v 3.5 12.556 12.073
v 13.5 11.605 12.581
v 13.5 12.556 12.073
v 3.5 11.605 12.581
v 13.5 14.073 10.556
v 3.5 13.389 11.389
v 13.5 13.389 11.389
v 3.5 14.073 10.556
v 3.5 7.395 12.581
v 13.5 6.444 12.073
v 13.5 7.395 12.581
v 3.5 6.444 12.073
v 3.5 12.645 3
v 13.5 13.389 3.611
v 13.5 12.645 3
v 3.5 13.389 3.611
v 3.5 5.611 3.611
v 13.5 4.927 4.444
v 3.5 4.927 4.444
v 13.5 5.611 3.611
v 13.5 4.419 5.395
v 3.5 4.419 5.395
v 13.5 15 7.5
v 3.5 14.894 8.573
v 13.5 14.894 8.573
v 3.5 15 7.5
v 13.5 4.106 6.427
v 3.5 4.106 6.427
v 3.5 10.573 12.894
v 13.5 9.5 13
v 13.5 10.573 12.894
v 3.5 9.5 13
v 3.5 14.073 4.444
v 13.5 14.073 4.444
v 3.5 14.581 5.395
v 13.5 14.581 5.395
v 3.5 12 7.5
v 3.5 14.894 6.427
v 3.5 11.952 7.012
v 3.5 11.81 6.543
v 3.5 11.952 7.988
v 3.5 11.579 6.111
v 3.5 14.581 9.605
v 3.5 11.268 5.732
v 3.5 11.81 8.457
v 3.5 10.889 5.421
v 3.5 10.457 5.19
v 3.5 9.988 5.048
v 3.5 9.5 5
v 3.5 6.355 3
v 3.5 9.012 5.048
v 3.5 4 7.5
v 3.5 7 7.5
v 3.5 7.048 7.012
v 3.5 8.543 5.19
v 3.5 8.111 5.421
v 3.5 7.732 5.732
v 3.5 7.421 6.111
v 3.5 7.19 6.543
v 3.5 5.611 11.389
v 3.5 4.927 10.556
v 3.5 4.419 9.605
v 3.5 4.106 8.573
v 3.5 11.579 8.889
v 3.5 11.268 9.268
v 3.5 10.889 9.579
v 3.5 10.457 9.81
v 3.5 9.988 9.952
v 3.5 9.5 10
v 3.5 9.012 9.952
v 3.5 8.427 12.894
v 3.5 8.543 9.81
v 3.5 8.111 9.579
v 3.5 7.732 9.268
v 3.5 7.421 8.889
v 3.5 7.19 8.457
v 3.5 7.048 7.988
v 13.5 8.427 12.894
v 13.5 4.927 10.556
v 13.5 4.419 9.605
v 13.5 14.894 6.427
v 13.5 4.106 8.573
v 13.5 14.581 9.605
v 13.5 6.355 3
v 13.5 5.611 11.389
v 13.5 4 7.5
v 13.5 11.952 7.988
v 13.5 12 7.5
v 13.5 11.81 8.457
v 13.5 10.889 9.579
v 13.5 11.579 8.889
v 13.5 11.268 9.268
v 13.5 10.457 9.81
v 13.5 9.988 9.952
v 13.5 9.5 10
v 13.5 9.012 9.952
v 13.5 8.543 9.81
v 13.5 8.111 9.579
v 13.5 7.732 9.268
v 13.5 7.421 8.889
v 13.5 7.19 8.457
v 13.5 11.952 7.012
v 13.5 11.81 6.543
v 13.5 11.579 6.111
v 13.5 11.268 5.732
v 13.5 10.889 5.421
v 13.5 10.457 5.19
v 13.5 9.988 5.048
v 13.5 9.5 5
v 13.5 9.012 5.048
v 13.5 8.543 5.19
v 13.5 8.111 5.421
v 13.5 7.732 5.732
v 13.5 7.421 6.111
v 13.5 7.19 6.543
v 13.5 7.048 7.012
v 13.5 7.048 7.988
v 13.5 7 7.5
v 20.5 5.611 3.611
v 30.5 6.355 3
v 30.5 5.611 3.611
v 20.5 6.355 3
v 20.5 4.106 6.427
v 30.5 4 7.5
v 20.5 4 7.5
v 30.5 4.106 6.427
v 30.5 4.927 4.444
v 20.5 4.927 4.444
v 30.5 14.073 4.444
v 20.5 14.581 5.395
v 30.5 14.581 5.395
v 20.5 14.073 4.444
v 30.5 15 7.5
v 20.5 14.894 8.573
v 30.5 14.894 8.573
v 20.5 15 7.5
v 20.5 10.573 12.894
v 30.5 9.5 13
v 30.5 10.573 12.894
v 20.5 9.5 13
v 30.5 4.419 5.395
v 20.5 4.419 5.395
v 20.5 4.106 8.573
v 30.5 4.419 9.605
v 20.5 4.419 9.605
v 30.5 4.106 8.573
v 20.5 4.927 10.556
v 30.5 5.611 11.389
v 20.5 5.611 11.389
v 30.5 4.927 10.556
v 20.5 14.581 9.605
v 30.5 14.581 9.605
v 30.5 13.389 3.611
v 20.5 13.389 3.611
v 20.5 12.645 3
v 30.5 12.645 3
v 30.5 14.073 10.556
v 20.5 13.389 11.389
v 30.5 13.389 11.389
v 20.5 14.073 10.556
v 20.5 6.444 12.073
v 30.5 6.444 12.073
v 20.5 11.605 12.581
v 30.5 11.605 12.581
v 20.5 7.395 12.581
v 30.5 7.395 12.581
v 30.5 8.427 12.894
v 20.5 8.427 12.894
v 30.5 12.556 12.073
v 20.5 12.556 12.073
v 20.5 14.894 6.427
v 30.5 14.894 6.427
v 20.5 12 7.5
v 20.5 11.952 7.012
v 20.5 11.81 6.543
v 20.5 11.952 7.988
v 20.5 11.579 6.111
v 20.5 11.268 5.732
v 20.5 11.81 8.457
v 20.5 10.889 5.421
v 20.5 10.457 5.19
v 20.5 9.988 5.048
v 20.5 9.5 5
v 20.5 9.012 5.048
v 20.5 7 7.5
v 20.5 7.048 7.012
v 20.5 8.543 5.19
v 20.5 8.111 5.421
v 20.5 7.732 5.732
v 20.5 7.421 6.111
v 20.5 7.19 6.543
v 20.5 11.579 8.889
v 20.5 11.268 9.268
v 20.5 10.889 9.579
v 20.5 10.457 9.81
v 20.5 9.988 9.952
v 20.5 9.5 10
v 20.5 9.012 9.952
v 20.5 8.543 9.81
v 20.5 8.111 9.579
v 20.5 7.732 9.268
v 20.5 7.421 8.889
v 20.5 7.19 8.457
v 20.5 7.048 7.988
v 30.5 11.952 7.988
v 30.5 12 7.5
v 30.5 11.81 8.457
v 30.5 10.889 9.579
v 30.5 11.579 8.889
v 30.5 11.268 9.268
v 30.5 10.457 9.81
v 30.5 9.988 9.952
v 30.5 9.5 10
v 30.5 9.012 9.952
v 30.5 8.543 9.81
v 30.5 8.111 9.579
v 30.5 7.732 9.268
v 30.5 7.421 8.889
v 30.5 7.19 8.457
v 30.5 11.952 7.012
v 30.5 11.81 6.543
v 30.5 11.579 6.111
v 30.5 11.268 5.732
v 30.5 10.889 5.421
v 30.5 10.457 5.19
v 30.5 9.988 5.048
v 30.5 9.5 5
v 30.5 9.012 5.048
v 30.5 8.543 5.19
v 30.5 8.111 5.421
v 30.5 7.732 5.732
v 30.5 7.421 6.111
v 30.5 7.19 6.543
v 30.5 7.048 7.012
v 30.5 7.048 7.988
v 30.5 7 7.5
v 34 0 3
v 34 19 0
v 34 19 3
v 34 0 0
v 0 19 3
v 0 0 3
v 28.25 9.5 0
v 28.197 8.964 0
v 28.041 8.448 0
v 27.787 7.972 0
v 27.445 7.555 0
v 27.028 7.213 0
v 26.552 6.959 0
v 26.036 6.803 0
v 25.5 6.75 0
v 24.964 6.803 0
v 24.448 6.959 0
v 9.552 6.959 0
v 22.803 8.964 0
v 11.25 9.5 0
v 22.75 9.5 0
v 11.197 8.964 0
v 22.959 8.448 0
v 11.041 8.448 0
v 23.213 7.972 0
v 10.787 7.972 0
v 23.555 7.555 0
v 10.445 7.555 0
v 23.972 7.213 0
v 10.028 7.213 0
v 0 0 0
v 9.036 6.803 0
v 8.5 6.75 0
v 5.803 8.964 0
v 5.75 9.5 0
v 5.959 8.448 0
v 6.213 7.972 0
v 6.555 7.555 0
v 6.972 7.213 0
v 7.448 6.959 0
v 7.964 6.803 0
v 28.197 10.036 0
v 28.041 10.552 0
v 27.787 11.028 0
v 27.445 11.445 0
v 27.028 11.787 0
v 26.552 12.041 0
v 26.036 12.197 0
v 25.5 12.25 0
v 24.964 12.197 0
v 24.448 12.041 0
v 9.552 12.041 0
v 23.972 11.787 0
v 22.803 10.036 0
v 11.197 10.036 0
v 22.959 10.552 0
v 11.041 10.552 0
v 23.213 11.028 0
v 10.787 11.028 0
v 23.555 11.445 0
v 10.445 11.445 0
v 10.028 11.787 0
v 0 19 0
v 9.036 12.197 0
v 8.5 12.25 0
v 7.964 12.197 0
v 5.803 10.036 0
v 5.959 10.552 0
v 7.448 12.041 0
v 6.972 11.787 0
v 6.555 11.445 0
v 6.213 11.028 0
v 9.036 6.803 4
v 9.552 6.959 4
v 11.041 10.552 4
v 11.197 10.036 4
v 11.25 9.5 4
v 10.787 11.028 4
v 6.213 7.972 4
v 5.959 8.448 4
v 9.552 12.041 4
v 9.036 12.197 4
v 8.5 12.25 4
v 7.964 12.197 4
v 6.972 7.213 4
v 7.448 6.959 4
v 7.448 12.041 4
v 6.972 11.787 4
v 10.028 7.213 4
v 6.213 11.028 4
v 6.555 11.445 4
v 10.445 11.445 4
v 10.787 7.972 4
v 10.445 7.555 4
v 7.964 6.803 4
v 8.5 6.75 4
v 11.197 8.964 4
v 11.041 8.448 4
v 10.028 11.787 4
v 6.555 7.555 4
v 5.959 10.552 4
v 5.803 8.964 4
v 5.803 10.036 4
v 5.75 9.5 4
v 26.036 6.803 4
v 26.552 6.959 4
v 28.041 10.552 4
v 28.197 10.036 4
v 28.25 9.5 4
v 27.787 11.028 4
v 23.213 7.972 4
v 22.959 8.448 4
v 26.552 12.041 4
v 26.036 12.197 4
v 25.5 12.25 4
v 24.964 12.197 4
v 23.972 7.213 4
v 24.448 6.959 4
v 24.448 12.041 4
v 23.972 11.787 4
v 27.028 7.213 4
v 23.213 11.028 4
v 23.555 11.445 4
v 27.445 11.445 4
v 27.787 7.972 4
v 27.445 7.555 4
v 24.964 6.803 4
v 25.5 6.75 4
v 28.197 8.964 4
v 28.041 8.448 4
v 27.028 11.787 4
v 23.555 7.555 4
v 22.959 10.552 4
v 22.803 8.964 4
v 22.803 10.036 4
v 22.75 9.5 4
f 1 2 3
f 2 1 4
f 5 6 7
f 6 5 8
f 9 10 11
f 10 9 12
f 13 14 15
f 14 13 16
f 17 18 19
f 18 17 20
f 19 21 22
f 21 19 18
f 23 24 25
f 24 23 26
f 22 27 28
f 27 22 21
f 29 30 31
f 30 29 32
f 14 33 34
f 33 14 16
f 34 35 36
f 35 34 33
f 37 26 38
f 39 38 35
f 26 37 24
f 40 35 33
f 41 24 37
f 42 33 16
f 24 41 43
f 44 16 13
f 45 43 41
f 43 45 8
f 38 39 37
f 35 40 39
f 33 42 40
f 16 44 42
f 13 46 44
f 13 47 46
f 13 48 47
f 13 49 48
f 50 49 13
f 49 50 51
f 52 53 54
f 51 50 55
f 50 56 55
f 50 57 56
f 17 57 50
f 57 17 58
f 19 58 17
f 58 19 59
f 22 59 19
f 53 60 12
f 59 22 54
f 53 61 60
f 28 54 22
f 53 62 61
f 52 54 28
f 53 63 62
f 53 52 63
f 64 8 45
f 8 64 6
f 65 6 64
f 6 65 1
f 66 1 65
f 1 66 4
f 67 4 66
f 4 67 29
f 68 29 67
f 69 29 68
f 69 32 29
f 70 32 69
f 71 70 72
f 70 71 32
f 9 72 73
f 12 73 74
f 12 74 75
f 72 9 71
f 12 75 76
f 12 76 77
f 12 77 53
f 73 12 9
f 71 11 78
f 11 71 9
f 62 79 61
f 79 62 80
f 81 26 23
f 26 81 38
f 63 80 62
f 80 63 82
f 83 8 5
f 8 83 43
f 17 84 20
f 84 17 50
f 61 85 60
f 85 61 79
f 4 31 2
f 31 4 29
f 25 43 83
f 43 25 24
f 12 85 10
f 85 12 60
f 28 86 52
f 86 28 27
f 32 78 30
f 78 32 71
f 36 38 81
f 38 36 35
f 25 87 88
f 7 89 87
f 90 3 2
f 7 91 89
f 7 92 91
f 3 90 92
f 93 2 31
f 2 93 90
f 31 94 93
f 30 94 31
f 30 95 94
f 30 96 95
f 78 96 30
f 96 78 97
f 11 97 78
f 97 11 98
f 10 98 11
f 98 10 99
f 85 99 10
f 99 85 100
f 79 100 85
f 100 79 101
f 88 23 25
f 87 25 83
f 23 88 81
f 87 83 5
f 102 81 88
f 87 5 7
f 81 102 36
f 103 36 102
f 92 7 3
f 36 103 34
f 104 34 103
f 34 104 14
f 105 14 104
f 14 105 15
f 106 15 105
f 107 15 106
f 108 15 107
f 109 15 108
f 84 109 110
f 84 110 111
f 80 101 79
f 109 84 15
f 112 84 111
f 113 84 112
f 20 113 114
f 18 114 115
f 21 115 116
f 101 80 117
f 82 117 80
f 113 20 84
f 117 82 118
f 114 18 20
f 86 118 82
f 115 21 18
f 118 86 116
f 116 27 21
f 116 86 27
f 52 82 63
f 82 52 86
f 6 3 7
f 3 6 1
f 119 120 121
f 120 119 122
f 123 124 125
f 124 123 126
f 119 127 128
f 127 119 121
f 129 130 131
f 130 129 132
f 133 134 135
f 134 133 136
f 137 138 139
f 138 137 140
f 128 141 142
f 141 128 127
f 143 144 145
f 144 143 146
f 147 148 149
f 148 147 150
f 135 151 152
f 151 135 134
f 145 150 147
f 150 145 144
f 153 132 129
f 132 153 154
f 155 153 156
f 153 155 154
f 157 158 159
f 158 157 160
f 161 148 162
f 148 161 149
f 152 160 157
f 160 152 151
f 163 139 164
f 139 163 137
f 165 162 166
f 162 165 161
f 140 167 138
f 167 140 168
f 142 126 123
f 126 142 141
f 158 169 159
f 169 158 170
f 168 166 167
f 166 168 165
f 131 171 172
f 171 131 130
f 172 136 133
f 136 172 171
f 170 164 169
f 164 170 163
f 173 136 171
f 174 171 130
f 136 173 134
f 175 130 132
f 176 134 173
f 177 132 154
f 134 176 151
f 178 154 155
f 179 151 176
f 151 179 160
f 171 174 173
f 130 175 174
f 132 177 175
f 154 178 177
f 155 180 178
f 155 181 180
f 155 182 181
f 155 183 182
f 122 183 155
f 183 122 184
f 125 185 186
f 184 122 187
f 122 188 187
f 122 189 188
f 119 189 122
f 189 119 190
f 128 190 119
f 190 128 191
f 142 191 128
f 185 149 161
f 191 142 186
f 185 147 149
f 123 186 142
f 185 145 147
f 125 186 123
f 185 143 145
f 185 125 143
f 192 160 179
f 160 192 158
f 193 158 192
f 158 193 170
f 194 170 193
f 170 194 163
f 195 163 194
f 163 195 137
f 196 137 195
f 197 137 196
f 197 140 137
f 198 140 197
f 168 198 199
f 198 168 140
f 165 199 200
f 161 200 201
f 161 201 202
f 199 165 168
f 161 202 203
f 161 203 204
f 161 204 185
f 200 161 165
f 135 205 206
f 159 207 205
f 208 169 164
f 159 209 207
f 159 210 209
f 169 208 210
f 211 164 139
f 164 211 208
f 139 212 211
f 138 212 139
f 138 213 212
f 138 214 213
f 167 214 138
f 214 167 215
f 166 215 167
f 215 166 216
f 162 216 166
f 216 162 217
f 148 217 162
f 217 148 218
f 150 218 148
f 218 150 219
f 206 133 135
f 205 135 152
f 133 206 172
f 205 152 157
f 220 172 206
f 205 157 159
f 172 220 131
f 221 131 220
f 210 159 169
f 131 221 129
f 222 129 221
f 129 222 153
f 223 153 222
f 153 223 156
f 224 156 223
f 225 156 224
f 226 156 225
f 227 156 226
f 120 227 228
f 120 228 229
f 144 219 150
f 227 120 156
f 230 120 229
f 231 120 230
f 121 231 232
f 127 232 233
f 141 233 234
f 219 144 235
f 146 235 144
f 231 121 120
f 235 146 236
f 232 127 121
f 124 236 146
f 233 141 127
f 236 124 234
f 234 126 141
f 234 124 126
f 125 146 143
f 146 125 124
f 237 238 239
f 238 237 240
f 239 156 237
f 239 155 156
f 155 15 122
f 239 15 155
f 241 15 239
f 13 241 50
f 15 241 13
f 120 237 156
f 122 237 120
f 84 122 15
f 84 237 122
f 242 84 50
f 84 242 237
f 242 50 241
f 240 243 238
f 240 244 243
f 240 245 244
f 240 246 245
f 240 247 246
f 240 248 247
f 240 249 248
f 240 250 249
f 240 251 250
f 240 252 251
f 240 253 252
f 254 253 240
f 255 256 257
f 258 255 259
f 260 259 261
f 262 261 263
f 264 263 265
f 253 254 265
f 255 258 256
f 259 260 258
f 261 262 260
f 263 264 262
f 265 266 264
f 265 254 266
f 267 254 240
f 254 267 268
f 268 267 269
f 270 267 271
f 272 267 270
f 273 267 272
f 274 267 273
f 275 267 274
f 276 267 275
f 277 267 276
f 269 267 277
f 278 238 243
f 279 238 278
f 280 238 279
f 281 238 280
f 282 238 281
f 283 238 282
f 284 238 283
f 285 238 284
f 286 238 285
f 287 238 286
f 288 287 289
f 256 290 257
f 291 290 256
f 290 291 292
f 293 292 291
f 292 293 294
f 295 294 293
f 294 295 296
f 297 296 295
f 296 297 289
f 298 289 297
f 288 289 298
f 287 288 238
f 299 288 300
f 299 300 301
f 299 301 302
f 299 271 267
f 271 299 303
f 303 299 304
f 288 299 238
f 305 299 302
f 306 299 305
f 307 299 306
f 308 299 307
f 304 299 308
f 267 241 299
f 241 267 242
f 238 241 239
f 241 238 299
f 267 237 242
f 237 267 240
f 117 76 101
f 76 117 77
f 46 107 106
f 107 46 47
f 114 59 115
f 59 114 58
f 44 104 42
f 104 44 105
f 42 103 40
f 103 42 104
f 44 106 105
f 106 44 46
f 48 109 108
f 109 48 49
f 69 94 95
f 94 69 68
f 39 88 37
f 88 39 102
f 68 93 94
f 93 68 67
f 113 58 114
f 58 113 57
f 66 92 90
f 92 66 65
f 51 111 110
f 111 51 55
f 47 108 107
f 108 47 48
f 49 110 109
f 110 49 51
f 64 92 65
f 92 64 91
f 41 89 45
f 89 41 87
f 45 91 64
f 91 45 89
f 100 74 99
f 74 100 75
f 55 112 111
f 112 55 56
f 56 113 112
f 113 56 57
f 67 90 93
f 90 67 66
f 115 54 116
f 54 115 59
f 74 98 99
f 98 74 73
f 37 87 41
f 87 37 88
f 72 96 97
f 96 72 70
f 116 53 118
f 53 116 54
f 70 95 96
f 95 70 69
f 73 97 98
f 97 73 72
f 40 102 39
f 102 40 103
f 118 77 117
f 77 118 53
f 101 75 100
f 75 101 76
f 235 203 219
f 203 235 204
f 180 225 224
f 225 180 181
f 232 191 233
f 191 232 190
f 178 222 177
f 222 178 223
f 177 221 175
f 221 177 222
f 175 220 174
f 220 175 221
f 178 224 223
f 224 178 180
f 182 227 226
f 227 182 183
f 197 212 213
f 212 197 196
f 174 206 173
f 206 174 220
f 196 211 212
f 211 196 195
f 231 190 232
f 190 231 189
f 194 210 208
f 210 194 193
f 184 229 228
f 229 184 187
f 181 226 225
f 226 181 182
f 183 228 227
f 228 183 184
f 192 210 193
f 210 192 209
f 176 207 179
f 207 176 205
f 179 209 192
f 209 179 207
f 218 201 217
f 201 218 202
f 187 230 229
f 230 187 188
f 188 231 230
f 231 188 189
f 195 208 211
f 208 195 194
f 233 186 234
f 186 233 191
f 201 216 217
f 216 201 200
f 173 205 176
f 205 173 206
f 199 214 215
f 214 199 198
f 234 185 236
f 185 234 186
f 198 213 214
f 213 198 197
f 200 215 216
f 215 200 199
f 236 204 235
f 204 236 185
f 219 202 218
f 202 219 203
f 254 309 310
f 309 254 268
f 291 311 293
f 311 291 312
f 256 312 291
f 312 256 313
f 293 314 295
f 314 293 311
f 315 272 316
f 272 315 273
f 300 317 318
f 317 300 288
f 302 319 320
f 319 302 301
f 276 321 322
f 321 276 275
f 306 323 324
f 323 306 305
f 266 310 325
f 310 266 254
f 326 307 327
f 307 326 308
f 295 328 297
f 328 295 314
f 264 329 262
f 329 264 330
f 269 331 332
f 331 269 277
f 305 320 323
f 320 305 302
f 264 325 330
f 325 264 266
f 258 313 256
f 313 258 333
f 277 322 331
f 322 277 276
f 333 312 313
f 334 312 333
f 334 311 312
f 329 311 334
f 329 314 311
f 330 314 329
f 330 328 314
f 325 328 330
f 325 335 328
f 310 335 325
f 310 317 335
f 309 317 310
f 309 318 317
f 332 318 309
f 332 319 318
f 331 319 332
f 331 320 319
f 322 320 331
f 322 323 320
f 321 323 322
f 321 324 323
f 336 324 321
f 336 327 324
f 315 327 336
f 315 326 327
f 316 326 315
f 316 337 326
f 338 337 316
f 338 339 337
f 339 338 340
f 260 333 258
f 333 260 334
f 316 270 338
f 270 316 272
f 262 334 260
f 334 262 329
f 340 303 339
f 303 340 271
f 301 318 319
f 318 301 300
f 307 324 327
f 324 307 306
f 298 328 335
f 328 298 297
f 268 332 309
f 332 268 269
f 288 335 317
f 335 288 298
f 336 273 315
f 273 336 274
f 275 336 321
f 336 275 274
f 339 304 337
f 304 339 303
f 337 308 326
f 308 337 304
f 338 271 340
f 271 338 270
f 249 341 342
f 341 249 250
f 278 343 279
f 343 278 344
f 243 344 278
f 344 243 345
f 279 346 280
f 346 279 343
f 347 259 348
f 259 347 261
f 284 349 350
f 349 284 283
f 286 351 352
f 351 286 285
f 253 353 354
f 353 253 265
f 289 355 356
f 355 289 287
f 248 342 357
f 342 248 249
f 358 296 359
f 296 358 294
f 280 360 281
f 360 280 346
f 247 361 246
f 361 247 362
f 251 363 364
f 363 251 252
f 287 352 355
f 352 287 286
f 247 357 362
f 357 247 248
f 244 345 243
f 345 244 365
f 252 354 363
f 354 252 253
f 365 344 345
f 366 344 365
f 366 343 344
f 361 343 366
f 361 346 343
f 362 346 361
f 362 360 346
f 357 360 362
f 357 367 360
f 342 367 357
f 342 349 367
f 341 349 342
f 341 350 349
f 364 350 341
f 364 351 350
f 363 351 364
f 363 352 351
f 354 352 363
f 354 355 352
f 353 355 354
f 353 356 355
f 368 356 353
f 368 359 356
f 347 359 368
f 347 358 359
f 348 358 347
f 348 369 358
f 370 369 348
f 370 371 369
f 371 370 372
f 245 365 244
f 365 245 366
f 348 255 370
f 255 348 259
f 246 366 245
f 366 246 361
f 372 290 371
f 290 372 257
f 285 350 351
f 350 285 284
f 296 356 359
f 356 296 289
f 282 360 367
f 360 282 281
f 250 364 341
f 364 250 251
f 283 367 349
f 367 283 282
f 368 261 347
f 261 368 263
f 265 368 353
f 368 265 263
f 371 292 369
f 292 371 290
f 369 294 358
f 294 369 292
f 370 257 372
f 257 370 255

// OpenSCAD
$fn = 32;

// ----------------------------------------------------------------------
// Cable clip: cable 5 mm, clamp 11 mm, base 34 mm
// ----------------------------------------------------------------------

// --- parameters (mm) ---
plate_x = 34;             // base length, X
plate_y = 19;             // base width, Y
plate_t = 3;              // base thickness
wire_seat_d = 11;         // clamp outside diameter
clip_t = 3;               // clamp wall
cable_d = 5;              // cable opening
ring_w = 10;              // clamp width along the cable
screw_d = 5.5;            // screw clearance
sink = 1;                 // overlap of the clamp into the base
pitch = 17;               // distance between the two clamps

module base() {
  cube([plate_x, plate_y, plate_t]);
}

module clamps() {
  for (sx = [-1, 1])
    translate([plate_x / 2 + sx * pitch / 2, plate_y / 2, plate_t + wire_seat_d / 2 - sink]) rotate([0, 90, 0])
      cylinder(h = ring_w, d = wire_seat_d, center = true);
}

difference() {
  union() {
    base();
    clamps();
  }
  for (sx = [-1, 1])
    translate([plate_x / 2 + sx * pitch / 2, plate_y / 2, plate_t + wire_seat_d / 2 - sink]) rotate([0, 90, 0]) translate([0, 0, -ring_w / 2 - 1]) cylinder(h = ring_w + 2, d = cable_d);
  translate([8.5, plate_y / 2, -1]) cylinder(h = plate_t + 2, d = screw_d);
  translate([25.5, plate_y / 2, -1]) cylinder(h = plate_t + 2, d = screw_d);
}
